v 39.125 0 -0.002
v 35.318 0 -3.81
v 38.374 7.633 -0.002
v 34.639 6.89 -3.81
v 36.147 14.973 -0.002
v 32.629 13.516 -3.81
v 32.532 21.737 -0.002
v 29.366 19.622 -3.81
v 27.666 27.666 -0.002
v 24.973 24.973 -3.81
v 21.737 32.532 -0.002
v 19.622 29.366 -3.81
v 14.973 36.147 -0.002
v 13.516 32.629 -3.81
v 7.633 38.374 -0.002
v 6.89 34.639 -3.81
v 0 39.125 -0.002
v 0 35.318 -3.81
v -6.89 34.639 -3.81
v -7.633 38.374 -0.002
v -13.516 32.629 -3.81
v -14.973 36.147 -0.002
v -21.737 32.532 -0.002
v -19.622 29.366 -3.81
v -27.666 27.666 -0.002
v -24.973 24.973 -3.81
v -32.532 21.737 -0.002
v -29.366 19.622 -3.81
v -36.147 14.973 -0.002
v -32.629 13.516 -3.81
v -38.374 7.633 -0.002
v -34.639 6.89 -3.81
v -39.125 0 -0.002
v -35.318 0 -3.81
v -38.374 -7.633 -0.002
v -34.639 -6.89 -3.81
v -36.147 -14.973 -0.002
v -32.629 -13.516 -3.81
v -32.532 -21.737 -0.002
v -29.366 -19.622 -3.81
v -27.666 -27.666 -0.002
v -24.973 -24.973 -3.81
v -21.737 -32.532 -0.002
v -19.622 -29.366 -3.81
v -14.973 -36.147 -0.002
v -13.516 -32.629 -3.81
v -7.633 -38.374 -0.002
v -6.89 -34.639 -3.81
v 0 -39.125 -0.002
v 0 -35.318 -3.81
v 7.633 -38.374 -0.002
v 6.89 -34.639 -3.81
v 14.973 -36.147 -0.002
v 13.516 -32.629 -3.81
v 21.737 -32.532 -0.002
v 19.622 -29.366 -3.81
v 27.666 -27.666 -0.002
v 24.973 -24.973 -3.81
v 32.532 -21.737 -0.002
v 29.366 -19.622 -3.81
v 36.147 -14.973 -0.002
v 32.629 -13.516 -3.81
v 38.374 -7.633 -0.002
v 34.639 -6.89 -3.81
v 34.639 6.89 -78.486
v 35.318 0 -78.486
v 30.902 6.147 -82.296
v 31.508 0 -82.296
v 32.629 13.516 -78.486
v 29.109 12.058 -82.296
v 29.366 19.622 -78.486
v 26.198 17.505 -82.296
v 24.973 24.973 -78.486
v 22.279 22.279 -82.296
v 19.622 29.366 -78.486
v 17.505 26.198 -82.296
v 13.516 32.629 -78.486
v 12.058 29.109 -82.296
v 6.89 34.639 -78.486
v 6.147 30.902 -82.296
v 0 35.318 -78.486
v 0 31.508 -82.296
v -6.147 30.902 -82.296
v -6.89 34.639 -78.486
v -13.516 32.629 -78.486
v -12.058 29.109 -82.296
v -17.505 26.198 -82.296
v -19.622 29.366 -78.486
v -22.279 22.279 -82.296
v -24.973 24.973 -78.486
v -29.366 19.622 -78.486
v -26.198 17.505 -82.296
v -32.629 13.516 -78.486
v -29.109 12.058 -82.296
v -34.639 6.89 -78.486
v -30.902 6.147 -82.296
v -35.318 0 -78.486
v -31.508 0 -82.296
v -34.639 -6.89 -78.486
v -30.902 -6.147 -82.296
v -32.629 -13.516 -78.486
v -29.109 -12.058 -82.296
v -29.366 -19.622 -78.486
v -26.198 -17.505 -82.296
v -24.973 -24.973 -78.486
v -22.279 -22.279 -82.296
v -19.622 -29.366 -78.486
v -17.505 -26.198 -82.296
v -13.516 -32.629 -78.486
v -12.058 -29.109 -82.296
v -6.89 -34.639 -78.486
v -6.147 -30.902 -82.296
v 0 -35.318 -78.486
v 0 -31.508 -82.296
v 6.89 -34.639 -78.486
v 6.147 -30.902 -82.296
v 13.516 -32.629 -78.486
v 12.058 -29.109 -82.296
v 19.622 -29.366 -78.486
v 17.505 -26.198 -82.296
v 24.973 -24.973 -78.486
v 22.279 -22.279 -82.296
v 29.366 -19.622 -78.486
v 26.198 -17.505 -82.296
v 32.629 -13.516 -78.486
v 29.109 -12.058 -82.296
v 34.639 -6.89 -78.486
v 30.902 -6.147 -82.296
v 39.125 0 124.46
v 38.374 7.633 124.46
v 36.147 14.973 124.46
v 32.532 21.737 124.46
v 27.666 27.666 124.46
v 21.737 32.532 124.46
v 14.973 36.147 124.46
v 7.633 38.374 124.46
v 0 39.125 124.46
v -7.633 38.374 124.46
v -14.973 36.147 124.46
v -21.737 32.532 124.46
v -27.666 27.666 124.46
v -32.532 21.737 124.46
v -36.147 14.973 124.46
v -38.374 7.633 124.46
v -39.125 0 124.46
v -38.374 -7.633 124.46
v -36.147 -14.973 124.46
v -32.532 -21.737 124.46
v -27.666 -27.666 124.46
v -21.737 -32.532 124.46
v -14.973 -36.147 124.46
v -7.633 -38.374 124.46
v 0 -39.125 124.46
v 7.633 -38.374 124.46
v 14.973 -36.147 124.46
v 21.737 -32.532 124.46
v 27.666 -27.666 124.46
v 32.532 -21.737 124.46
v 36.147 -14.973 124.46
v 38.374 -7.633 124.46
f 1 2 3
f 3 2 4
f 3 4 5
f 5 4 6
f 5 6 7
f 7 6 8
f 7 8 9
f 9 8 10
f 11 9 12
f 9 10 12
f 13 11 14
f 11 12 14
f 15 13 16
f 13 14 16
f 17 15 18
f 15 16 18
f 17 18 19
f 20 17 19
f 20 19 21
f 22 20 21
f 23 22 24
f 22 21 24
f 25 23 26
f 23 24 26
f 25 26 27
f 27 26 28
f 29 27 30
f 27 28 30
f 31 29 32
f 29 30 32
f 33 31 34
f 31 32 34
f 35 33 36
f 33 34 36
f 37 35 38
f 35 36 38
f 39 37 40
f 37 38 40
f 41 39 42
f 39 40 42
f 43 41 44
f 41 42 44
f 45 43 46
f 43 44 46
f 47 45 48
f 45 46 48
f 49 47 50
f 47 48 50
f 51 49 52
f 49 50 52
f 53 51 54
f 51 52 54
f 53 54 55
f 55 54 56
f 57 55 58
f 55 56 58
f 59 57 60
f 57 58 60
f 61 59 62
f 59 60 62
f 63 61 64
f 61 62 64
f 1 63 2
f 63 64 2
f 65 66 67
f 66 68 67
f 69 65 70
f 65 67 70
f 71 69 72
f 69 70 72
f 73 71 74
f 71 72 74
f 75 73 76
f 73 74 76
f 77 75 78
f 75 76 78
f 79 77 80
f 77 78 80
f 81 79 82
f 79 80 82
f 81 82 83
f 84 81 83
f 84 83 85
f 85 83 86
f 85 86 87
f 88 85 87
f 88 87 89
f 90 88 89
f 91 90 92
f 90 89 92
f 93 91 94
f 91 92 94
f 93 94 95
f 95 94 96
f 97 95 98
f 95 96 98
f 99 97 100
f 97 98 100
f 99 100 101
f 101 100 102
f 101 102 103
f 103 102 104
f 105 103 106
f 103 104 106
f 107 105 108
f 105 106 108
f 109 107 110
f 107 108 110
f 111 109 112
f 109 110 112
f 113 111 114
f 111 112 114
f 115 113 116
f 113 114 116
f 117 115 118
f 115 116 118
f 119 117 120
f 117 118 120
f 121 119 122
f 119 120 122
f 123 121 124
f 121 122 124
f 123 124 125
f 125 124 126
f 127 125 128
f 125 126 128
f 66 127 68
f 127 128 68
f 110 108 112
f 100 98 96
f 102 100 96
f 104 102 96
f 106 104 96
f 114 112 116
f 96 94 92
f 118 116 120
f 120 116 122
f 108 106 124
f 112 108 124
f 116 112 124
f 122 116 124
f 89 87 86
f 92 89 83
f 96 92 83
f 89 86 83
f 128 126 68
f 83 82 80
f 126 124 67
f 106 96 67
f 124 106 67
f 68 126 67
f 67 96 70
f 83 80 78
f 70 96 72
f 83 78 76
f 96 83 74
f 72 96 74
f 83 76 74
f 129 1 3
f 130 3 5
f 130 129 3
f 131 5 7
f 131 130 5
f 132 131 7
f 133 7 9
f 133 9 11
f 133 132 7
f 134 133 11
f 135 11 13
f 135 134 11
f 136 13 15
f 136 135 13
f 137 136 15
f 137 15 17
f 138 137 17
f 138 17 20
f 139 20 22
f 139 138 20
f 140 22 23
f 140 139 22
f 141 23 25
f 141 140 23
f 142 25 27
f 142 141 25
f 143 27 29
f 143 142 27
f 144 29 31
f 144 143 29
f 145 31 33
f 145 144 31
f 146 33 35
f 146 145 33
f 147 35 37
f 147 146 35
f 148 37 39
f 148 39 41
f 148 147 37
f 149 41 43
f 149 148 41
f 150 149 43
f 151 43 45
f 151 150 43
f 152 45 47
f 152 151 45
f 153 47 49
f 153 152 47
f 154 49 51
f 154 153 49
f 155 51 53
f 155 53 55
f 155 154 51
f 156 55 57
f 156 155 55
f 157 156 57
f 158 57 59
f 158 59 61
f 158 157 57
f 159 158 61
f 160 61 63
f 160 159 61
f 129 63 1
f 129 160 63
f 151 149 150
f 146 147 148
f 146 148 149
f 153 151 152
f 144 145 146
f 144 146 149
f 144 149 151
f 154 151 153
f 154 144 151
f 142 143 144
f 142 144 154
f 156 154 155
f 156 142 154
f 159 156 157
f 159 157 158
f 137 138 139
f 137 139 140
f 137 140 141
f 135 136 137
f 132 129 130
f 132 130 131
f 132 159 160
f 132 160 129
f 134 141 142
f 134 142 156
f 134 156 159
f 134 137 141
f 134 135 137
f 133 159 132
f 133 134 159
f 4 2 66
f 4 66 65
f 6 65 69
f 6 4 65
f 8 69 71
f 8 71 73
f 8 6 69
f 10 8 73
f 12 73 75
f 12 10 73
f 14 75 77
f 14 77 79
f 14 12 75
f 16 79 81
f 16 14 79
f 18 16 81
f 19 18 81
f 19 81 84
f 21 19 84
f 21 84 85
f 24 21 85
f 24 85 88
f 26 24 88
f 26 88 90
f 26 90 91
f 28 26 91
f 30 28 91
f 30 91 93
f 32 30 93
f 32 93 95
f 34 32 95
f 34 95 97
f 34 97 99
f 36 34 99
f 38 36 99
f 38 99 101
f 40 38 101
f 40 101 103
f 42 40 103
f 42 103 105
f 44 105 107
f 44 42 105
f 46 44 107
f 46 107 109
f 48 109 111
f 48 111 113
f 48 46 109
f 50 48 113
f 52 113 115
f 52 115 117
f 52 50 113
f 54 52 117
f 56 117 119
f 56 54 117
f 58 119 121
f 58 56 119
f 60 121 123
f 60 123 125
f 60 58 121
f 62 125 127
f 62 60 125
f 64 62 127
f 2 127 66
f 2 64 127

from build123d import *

# Parameters (mm, degrees)
F0_R        = 39.1254691666
F1_DEPTH    = 124.46
F2_R        = 35.3178604587
F3_DEPTH    = 82.296
F4_S5_R     = 39.1254691666
F4_T6_DEPTH = 57


# Not quite as in the source:
# - a fillet or chamfer that OpenCascade refuses, or shapes differently, is made with other operations: its cross-section is extruded or revolved along the edge and cut away or added
# - a feature of the source that left no trace in its solid (it failed there, or was rolled back) is left out


with BuildPart() as f1:
    # F0 (on Top) → F1 (new body)
    with BuildSketch(Plane.XY):
        Circle(F0_R)
    extrude(amount=F1_DEPTH)

    # F2 (on Top) → F3 (join)
    with BuildSketch(Plane.XY):
        Circle(F2_R)
    extrude(amount=-F3_DEPTH)

    # F4: chamfer of 3.81 on 3 edges, made by hand


with BuildPart() as f4_tool2:
    # F4_s3 → F4_t4 (revolve)
    with BuildSketch(Plane.XZ):
        Polygon((39.1278604587, 0), (35.3178604587, -3.81), (35.3178604587, 0), align=None)
    revolve(axis=Axis((0, 0, 0), (0, 0, 1)))

    # F4_s5 → F4_t6 (intersect, symmetric)
    with BuildSketch(Plane.XY.offset(-1.9)):
        Circle(F4_S5_R)
    extrude(amount=F4_T6_DEPTH, both=True, mode=Mode.INTERSECT)


with BuildPart() as f1_1:
    add(f1.part)

    # F4_t1: union F4_tool2
    add(f4_tool2.part)

    # F4_s7 → F4_t8 (revolve, cut)
    with BuildSketch(Plane.XZ):
        Polygon((35.3178604587, -78.486), (31.5078604587, -82.296), (35.3178604587, -82.296), align=None)
    revolve(axis=Axis((0, 0, -82.296), (0, 0, 1)), mode=Mode.SUBTRACT)


solid = f1_1.part
